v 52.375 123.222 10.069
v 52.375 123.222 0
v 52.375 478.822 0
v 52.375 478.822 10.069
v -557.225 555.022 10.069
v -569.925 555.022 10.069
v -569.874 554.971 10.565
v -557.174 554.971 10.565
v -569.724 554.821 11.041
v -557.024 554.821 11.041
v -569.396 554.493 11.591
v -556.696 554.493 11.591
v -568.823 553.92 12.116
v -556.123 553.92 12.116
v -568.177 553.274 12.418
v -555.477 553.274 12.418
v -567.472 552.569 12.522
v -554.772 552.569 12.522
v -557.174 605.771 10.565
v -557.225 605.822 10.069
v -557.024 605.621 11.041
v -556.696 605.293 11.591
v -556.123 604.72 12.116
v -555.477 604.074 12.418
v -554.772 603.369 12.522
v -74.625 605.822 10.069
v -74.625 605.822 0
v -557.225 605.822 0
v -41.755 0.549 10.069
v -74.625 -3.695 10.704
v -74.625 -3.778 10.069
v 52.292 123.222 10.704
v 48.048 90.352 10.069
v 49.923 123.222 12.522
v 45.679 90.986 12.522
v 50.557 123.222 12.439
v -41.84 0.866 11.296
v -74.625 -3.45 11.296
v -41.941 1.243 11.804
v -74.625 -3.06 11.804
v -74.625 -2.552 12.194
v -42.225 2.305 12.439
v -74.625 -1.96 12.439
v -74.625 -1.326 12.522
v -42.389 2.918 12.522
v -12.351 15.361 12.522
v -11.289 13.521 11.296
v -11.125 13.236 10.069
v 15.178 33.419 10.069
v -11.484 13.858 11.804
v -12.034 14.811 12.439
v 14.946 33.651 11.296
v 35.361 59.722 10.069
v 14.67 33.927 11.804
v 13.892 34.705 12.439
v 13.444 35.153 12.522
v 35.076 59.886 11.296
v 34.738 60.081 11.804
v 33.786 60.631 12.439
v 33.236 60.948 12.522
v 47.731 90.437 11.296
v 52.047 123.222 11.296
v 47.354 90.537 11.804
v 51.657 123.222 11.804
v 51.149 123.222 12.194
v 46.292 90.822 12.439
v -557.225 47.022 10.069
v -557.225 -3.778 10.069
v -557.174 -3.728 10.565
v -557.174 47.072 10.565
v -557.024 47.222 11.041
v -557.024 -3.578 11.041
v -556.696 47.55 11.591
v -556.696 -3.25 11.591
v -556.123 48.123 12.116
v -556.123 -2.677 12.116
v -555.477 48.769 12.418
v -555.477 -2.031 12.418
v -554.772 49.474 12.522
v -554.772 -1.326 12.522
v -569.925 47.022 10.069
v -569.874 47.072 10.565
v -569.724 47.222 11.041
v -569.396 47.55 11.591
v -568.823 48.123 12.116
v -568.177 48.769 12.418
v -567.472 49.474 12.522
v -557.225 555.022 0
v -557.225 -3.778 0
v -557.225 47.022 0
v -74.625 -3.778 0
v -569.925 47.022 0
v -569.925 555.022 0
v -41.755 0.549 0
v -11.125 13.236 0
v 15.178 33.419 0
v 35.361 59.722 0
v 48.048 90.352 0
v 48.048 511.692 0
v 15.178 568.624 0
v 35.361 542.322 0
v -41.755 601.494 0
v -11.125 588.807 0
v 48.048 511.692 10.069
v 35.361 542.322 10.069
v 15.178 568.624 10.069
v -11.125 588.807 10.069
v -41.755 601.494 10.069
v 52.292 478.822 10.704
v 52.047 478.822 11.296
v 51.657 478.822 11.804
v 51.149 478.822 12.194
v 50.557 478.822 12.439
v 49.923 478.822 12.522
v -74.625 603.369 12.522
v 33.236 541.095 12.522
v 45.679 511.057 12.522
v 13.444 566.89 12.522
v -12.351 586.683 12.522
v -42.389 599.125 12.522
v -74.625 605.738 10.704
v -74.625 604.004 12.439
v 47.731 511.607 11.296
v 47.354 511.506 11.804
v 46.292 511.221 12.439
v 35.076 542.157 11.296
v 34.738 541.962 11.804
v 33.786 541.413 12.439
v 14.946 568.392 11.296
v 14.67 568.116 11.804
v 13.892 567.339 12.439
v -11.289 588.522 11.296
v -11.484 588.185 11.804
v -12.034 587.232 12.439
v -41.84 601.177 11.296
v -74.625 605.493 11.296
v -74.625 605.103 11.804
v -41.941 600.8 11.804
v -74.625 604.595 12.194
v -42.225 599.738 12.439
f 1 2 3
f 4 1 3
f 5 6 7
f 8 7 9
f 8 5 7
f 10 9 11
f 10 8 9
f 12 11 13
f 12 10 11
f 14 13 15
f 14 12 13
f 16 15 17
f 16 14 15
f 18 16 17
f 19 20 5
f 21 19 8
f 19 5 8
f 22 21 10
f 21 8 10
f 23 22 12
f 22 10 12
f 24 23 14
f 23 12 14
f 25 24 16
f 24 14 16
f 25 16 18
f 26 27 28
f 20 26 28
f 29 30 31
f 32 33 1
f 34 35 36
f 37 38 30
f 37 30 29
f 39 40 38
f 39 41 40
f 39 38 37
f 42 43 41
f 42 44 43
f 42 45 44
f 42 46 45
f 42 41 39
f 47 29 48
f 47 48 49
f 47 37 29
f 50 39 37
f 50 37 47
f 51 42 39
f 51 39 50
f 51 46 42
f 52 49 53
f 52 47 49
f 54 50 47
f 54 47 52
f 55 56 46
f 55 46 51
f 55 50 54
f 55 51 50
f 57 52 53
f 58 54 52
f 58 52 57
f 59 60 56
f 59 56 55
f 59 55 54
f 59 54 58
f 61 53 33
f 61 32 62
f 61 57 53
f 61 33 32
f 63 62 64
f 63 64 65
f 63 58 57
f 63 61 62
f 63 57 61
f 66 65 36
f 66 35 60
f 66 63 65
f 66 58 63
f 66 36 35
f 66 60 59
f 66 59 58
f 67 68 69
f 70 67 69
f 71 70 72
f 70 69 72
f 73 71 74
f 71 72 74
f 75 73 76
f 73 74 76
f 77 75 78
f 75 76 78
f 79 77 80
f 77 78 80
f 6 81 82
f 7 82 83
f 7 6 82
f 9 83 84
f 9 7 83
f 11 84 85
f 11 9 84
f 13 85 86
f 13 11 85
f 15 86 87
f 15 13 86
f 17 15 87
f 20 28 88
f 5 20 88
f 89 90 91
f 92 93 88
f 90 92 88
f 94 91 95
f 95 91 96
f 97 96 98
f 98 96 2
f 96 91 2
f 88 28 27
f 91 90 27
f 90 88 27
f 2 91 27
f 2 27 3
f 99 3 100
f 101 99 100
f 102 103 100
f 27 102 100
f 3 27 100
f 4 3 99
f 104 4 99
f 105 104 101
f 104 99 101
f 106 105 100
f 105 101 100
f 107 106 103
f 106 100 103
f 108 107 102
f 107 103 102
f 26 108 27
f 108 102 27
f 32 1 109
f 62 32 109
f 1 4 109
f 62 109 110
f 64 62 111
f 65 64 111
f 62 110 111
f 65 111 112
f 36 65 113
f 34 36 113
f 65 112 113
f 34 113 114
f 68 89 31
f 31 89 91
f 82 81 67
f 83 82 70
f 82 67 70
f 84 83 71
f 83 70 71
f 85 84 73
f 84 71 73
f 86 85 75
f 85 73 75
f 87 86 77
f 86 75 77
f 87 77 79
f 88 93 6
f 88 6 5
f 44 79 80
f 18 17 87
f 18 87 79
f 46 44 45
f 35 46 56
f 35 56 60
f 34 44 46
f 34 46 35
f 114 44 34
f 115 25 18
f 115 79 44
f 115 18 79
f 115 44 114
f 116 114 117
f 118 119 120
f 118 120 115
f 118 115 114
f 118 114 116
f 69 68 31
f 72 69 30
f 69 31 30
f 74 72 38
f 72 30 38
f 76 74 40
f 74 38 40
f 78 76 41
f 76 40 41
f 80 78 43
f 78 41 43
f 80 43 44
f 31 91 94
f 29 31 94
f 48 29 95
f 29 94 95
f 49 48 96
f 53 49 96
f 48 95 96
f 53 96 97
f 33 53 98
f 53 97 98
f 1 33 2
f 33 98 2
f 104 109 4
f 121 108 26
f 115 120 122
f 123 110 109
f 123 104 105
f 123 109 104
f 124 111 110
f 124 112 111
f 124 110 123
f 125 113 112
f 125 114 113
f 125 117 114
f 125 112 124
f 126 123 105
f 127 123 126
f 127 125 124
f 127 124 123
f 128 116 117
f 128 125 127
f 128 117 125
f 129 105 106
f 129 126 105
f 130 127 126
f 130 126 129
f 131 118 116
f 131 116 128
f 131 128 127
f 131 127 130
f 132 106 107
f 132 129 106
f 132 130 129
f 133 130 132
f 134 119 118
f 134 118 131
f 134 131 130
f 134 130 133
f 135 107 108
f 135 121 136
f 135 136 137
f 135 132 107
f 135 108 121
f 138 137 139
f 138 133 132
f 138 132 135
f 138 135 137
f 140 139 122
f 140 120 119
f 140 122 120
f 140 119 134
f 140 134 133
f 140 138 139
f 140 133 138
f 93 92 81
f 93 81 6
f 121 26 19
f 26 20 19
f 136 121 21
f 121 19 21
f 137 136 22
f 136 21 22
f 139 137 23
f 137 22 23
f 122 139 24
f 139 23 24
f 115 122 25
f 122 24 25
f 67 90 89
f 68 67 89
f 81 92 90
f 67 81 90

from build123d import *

# Parameters (mm, degrees)
F0_W     = 12.7
F0_H     = 508
F1_DEPTH = 12.5222
F2_R     = 2.452841


with BuildPart() as f1:
    # F0 (on Top) → F1 (new body)
    with BuildSketch(Plane.XY):
        with BuildLine():
            Line((-74.624596, 605.821555), (-557.224596, 605.821555))
            Line((-557.224596, 605.821555), (-557.224596, 555.021555))
            Line((-557.224596, 555.021555), (-557.224596, 47.021555))
            Line((-557.224596, 47.021555), (-557.224596, -3.778445))
            Line((-557.224596, -3.778445), (-74.624596, -3.778445))
            ThreePointArc((-74.624596, -3.778445), (15.177965, 33.418993), (52.375404, 123.221555))
            Line((52.375404, 123.221555), (52.375404, 478.821555))
            ThreePointArc((52.375404, 478.821555), (15.177965, 568.624116), (-74.624596, 605.821555))
        make_face()
        with Locations((-563.574596, 301.021555)):
            Rectangle(F0_W, F0_H)
    extrude(amount=F1_DEPTH)

    # F2
    f2_edges = [f1.edges().sort_by_distance(p)[0] for p in [
        (52.375404, 301.021555, 12.5222),
        (15.177965, 568.624116, 12.5222),
        (-315.924596, 605.821555, 12.5222),
        (-557.224596, 580.421555, 12.5222),
        (-563.574596, 555.021555, 12.5222),
        (-569.924596, 301.021555, 12.5222),
        (-563.574596, 47.021555, 12.5222),
        (-557.224596, 21.621555, 12.5222),
        (-315.924596, -3.778445, 12.5222),
        (15.177965, 33.418993, 12.5222),
    ]]
    fillet(f2_edges, radius=F2_R)


solid = f1.part
